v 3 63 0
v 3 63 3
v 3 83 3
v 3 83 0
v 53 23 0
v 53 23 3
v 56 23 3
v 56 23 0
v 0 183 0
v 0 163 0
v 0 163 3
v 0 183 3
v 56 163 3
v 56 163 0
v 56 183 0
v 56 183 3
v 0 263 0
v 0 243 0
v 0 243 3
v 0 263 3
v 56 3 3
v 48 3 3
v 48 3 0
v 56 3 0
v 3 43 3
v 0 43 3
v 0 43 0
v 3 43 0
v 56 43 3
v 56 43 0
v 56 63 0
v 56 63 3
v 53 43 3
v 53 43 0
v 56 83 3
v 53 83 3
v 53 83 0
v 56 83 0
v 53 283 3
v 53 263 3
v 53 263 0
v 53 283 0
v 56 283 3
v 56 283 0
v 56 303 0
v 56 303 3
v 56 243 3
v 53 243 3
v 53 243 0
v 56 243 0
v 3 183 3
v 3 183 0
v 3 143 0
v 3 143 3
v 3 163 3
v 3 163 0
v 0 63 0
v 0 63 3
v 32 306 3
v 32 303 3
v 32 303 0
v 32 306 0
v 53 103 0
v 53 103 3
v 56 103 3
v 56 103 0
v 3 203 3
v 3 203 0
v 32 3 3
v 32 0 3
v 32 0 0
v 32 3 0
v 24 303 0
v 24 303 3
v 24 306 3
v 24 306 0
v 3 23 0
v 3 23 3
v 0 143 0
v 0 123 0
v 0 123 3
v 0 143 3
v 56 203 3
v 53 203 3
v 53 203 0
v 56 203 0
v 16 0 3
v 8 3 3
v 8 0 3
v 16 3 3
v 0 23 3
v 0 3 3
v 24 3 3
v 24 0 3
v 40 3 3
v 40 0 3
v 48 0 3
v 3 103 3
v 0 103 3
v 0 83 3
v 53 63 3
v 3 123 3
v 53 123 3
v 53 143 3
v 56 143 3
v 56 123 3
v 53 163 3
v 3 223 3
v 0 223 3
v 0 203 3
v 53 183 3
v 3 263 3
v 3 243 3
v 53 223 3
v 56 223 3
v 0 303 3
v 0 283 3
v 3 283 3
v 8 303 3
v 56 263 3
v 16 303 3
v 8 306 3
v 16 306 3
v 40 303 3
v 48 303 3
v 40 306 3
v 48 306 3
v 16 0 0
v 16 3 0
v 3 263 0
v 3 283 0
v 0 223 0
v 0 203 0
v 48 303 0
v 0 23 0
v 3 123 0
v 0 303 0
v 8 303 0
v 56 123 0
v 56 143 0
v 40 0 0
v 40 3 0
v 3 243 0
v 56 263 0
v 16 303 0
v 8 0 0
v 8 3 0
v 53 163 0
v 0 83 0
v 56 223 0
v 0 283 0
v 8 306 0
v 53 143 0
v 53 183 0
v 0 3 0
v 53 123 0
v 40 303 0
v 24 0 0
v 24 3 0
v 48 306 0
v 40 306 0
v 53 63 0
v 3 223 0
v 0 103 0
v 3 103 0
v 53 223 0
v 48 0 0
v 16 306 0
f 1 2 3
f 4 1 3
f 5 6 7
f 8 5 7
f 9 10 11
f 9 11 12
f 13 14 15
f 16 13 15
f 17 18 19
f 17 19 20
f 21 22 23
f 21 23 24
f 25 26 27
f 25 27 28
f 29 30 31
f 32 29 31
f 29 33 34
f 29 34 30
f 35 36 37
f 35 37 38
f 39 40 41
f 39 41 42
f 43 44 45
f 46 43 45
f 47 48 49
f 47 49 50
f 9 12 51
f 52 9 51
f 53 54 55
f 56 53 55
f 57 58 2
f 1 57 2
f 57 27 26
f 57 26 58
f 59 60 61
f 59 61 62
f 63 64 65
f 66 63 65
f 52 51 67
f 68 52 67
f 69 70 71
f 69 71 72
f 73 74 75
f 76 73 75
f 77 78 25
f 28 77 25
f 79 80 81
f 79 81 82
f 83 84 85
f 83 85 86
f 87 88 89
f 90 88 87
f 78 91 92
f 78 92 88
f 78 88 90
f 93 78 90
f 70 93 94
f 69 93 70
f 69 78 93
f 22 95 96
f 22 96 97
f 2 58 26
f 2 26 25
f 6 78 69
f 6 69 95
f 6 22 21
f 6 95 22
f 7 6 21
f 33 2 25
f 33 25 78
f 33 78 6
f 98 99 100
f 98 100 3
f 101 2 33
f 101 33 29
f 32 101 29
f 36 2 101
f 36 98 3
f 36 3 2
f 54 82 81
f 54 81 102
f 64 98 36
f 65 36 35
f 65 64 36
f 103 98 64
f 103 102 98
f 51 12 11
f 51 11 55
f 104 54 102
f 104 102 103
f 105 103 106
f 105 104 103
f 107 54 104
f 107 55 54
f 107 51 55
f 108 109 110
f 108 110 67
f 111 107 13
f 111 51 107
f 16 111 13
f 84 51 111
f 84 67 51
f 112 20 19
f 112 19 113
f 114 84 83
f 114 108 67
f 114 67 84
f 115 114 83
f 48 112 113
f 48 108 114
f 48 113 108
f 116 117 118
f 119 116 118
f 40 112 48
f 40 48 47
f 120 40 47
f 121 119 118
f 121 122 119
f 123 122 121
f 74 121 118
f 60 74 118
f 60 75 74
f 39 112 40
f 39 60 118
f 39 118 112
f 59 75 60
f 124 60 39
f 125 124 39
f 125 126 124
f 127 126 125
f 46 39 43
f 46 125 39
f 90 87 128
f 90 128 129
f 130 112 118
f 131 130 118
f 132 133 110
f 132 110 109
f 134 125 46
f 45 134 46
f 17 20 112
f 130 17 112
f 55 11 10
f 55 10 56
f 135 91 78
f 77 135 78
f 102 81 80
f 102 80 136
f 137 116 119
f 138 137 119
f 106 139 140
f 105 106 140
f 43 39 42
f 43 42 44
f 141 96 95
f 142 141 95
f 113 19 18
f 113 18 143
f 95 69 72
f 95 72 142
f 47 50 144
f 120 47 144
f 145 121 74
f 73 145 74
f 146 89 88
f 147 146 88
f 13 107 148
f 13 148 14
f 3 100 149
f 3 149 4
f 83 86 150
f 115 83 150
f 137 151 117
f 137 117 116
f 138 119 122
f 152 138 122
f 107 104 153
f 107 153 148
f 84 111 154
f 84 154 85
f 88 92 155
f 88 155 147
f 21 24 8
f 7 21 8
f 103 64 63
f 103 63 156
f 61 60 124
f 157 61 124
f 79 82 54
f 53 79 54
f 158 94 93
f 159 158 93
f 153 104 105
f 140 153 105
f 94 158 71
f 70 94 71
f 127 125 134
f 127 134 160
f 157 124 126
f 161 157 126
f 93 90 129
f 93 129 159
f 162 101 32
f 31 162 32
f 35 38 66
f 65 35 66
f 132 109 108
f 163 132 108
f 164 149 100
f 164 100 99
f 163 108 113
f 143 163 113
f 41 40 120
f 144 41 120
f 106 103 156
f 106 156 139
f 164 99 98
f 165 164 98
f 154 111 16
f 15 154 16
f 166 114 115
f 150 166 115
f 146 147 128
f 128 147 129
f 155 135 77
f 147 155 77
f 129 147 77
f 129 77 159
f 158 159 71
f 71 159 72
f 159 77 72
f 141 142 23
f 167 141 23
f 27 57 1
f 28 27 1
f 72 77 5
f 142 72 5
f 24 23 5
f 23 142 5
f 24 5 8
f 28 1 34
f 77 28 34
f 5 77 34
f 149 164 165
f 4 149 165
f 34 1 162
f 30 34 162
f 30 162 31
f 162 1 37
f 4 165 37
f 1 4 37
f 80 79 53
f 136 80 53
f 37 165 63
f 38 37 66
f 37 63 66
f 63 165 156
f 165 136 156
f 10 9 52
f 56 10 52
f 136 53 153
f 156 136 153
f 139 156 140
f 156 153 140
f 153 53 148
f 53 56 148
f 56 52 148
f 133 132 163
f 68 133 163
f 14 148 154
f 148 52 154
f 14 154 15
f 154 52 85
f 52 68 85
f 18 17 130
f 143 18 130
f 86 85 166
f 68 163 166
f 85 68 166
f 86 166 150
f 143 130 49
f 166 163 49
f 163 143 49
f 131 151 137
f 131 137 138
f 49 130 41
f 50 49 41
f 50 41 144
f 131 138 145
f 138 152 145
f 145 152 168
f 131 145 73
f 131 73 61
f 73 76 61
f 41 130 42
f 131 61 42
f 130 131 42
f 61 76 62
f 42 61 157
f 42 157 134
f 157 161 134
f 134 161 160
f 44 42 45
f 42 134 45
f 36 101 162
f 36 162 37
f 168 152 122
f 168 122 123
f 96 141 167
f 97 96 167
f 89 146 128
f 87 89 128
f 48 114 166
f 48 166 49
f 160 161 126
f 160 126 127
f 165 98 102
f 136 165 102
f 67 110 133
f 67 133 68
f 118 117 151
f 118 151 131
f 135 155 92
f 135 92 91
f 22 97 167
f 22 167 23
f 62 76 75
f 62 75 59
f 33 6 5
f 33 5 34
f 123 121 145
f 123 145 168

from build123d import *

# Parameters (mm, degrees)
SKETCH_W      = 56
SKETCH_H      = 306
PAD_DEPTH     = 3
SKETCH001_W   = 8
SKETCH001_H   = 3
SKETCH001_W_2 = 3
SKETCH001_H_2 = 20
POCKET_DEPTH  = 3.001


with BuildPart() as part:
    # Sketch → Pad (new body)
    with BuildSketch(Plane.XY):
        with Locations((28, 153)):
            Rectangle(SKETCH_W, SKETCH_H)
    extrude(amount=PAD_DEPTH)

    # Sketch001 (on Face6 of Pad) → Pocket (cut, through all)
    with BuildSketch(Plane.XY.offset(3)):
        with Locations((4, 1.5)):
            Rectangle(SKETCH001_W, SKETCH001_H)
        with Locations((20, 1.5)):
            Rectangle(SKETCH001_W, SKETCH001_H)
        with Locations((36, 1.5)):
            Rectangle(SKETCH001_W, SKETCH001_H)
        with Locations((52, 1.5)):
            Rectangle(SKETCH001_W, SKETCH001_H)
        with Locations((4, 304.5)):
            Rectangle(SKETCH001_W, SKETCH001_H)
        with Locations((20, 304.5)):
            Rectangle(SKETCH001_W, SKETCH001_H)
        with Locations((36, 304.5)):
            Rectangle(SKETCH001_W, SKETCH001_H)
        with Locations((52, 304.5)):
            Rectangle(SKETCH001_W, SKETCH001_H)
        with Locations((1.5, 33)):
            Rectangle(SKETCH001_W_2, SKETCH001_H_2)
        with Locations((1.5, 73)):
            Rectangle(SKETCH001_W_2, SKETCH001_H_2)
        with Locations((1.5, 113)):
            Rectangle(SKETCH001_W_2, SKETCH001_H_2)
        with Locations((1.5, 153)):
            Rectangle(SKETCH001_W_2, SKETCH001_H_2)
        with Locations((1.5, 193)):
            Rectangle(SKETCH001_W_2, SKETCH001_H_2)
        with Locations((1.5, 233)):
            Rectangle(SKETCH001_W_2, SKETCH001_H_2)
        with Locations((1.5, 273)):
            Rectangle(SKETCH001_W_2, SKETCH001_H_2)
        with Locations((54.5, 33)):
            Rectangle(SKETCH001_W_2, SKETCH001_H_2)
        with Locations((54.5, 73)):
            Rectangle(SKETCH001_W_2, SKETCH001_H_2)
        with Locations((54.5, 113)):
            Rectangle(SKETCH001_W_2, SKETCH001_H_2)
        with Locations((54.5, 153)):
            Rectangle(SKETCH001_W_2, SKETCH001_H_2)
        with Locations((54.5, 193)):
            Rectangle(SKETCH001_W_2, SKETCH001_H_2)
        with Locations((54.5, 233)):
            Rectangle(SKETCH001_W_2, SKETCH001_H_2)
        with Locations((54.5, 273)):
            Rectangle(SKETCH001_W_2, SKETCH001_H_2)
    extrude(amount=-POCKET_DEPTH, mode=Mode.SUBTRACT)


solid = part.part
